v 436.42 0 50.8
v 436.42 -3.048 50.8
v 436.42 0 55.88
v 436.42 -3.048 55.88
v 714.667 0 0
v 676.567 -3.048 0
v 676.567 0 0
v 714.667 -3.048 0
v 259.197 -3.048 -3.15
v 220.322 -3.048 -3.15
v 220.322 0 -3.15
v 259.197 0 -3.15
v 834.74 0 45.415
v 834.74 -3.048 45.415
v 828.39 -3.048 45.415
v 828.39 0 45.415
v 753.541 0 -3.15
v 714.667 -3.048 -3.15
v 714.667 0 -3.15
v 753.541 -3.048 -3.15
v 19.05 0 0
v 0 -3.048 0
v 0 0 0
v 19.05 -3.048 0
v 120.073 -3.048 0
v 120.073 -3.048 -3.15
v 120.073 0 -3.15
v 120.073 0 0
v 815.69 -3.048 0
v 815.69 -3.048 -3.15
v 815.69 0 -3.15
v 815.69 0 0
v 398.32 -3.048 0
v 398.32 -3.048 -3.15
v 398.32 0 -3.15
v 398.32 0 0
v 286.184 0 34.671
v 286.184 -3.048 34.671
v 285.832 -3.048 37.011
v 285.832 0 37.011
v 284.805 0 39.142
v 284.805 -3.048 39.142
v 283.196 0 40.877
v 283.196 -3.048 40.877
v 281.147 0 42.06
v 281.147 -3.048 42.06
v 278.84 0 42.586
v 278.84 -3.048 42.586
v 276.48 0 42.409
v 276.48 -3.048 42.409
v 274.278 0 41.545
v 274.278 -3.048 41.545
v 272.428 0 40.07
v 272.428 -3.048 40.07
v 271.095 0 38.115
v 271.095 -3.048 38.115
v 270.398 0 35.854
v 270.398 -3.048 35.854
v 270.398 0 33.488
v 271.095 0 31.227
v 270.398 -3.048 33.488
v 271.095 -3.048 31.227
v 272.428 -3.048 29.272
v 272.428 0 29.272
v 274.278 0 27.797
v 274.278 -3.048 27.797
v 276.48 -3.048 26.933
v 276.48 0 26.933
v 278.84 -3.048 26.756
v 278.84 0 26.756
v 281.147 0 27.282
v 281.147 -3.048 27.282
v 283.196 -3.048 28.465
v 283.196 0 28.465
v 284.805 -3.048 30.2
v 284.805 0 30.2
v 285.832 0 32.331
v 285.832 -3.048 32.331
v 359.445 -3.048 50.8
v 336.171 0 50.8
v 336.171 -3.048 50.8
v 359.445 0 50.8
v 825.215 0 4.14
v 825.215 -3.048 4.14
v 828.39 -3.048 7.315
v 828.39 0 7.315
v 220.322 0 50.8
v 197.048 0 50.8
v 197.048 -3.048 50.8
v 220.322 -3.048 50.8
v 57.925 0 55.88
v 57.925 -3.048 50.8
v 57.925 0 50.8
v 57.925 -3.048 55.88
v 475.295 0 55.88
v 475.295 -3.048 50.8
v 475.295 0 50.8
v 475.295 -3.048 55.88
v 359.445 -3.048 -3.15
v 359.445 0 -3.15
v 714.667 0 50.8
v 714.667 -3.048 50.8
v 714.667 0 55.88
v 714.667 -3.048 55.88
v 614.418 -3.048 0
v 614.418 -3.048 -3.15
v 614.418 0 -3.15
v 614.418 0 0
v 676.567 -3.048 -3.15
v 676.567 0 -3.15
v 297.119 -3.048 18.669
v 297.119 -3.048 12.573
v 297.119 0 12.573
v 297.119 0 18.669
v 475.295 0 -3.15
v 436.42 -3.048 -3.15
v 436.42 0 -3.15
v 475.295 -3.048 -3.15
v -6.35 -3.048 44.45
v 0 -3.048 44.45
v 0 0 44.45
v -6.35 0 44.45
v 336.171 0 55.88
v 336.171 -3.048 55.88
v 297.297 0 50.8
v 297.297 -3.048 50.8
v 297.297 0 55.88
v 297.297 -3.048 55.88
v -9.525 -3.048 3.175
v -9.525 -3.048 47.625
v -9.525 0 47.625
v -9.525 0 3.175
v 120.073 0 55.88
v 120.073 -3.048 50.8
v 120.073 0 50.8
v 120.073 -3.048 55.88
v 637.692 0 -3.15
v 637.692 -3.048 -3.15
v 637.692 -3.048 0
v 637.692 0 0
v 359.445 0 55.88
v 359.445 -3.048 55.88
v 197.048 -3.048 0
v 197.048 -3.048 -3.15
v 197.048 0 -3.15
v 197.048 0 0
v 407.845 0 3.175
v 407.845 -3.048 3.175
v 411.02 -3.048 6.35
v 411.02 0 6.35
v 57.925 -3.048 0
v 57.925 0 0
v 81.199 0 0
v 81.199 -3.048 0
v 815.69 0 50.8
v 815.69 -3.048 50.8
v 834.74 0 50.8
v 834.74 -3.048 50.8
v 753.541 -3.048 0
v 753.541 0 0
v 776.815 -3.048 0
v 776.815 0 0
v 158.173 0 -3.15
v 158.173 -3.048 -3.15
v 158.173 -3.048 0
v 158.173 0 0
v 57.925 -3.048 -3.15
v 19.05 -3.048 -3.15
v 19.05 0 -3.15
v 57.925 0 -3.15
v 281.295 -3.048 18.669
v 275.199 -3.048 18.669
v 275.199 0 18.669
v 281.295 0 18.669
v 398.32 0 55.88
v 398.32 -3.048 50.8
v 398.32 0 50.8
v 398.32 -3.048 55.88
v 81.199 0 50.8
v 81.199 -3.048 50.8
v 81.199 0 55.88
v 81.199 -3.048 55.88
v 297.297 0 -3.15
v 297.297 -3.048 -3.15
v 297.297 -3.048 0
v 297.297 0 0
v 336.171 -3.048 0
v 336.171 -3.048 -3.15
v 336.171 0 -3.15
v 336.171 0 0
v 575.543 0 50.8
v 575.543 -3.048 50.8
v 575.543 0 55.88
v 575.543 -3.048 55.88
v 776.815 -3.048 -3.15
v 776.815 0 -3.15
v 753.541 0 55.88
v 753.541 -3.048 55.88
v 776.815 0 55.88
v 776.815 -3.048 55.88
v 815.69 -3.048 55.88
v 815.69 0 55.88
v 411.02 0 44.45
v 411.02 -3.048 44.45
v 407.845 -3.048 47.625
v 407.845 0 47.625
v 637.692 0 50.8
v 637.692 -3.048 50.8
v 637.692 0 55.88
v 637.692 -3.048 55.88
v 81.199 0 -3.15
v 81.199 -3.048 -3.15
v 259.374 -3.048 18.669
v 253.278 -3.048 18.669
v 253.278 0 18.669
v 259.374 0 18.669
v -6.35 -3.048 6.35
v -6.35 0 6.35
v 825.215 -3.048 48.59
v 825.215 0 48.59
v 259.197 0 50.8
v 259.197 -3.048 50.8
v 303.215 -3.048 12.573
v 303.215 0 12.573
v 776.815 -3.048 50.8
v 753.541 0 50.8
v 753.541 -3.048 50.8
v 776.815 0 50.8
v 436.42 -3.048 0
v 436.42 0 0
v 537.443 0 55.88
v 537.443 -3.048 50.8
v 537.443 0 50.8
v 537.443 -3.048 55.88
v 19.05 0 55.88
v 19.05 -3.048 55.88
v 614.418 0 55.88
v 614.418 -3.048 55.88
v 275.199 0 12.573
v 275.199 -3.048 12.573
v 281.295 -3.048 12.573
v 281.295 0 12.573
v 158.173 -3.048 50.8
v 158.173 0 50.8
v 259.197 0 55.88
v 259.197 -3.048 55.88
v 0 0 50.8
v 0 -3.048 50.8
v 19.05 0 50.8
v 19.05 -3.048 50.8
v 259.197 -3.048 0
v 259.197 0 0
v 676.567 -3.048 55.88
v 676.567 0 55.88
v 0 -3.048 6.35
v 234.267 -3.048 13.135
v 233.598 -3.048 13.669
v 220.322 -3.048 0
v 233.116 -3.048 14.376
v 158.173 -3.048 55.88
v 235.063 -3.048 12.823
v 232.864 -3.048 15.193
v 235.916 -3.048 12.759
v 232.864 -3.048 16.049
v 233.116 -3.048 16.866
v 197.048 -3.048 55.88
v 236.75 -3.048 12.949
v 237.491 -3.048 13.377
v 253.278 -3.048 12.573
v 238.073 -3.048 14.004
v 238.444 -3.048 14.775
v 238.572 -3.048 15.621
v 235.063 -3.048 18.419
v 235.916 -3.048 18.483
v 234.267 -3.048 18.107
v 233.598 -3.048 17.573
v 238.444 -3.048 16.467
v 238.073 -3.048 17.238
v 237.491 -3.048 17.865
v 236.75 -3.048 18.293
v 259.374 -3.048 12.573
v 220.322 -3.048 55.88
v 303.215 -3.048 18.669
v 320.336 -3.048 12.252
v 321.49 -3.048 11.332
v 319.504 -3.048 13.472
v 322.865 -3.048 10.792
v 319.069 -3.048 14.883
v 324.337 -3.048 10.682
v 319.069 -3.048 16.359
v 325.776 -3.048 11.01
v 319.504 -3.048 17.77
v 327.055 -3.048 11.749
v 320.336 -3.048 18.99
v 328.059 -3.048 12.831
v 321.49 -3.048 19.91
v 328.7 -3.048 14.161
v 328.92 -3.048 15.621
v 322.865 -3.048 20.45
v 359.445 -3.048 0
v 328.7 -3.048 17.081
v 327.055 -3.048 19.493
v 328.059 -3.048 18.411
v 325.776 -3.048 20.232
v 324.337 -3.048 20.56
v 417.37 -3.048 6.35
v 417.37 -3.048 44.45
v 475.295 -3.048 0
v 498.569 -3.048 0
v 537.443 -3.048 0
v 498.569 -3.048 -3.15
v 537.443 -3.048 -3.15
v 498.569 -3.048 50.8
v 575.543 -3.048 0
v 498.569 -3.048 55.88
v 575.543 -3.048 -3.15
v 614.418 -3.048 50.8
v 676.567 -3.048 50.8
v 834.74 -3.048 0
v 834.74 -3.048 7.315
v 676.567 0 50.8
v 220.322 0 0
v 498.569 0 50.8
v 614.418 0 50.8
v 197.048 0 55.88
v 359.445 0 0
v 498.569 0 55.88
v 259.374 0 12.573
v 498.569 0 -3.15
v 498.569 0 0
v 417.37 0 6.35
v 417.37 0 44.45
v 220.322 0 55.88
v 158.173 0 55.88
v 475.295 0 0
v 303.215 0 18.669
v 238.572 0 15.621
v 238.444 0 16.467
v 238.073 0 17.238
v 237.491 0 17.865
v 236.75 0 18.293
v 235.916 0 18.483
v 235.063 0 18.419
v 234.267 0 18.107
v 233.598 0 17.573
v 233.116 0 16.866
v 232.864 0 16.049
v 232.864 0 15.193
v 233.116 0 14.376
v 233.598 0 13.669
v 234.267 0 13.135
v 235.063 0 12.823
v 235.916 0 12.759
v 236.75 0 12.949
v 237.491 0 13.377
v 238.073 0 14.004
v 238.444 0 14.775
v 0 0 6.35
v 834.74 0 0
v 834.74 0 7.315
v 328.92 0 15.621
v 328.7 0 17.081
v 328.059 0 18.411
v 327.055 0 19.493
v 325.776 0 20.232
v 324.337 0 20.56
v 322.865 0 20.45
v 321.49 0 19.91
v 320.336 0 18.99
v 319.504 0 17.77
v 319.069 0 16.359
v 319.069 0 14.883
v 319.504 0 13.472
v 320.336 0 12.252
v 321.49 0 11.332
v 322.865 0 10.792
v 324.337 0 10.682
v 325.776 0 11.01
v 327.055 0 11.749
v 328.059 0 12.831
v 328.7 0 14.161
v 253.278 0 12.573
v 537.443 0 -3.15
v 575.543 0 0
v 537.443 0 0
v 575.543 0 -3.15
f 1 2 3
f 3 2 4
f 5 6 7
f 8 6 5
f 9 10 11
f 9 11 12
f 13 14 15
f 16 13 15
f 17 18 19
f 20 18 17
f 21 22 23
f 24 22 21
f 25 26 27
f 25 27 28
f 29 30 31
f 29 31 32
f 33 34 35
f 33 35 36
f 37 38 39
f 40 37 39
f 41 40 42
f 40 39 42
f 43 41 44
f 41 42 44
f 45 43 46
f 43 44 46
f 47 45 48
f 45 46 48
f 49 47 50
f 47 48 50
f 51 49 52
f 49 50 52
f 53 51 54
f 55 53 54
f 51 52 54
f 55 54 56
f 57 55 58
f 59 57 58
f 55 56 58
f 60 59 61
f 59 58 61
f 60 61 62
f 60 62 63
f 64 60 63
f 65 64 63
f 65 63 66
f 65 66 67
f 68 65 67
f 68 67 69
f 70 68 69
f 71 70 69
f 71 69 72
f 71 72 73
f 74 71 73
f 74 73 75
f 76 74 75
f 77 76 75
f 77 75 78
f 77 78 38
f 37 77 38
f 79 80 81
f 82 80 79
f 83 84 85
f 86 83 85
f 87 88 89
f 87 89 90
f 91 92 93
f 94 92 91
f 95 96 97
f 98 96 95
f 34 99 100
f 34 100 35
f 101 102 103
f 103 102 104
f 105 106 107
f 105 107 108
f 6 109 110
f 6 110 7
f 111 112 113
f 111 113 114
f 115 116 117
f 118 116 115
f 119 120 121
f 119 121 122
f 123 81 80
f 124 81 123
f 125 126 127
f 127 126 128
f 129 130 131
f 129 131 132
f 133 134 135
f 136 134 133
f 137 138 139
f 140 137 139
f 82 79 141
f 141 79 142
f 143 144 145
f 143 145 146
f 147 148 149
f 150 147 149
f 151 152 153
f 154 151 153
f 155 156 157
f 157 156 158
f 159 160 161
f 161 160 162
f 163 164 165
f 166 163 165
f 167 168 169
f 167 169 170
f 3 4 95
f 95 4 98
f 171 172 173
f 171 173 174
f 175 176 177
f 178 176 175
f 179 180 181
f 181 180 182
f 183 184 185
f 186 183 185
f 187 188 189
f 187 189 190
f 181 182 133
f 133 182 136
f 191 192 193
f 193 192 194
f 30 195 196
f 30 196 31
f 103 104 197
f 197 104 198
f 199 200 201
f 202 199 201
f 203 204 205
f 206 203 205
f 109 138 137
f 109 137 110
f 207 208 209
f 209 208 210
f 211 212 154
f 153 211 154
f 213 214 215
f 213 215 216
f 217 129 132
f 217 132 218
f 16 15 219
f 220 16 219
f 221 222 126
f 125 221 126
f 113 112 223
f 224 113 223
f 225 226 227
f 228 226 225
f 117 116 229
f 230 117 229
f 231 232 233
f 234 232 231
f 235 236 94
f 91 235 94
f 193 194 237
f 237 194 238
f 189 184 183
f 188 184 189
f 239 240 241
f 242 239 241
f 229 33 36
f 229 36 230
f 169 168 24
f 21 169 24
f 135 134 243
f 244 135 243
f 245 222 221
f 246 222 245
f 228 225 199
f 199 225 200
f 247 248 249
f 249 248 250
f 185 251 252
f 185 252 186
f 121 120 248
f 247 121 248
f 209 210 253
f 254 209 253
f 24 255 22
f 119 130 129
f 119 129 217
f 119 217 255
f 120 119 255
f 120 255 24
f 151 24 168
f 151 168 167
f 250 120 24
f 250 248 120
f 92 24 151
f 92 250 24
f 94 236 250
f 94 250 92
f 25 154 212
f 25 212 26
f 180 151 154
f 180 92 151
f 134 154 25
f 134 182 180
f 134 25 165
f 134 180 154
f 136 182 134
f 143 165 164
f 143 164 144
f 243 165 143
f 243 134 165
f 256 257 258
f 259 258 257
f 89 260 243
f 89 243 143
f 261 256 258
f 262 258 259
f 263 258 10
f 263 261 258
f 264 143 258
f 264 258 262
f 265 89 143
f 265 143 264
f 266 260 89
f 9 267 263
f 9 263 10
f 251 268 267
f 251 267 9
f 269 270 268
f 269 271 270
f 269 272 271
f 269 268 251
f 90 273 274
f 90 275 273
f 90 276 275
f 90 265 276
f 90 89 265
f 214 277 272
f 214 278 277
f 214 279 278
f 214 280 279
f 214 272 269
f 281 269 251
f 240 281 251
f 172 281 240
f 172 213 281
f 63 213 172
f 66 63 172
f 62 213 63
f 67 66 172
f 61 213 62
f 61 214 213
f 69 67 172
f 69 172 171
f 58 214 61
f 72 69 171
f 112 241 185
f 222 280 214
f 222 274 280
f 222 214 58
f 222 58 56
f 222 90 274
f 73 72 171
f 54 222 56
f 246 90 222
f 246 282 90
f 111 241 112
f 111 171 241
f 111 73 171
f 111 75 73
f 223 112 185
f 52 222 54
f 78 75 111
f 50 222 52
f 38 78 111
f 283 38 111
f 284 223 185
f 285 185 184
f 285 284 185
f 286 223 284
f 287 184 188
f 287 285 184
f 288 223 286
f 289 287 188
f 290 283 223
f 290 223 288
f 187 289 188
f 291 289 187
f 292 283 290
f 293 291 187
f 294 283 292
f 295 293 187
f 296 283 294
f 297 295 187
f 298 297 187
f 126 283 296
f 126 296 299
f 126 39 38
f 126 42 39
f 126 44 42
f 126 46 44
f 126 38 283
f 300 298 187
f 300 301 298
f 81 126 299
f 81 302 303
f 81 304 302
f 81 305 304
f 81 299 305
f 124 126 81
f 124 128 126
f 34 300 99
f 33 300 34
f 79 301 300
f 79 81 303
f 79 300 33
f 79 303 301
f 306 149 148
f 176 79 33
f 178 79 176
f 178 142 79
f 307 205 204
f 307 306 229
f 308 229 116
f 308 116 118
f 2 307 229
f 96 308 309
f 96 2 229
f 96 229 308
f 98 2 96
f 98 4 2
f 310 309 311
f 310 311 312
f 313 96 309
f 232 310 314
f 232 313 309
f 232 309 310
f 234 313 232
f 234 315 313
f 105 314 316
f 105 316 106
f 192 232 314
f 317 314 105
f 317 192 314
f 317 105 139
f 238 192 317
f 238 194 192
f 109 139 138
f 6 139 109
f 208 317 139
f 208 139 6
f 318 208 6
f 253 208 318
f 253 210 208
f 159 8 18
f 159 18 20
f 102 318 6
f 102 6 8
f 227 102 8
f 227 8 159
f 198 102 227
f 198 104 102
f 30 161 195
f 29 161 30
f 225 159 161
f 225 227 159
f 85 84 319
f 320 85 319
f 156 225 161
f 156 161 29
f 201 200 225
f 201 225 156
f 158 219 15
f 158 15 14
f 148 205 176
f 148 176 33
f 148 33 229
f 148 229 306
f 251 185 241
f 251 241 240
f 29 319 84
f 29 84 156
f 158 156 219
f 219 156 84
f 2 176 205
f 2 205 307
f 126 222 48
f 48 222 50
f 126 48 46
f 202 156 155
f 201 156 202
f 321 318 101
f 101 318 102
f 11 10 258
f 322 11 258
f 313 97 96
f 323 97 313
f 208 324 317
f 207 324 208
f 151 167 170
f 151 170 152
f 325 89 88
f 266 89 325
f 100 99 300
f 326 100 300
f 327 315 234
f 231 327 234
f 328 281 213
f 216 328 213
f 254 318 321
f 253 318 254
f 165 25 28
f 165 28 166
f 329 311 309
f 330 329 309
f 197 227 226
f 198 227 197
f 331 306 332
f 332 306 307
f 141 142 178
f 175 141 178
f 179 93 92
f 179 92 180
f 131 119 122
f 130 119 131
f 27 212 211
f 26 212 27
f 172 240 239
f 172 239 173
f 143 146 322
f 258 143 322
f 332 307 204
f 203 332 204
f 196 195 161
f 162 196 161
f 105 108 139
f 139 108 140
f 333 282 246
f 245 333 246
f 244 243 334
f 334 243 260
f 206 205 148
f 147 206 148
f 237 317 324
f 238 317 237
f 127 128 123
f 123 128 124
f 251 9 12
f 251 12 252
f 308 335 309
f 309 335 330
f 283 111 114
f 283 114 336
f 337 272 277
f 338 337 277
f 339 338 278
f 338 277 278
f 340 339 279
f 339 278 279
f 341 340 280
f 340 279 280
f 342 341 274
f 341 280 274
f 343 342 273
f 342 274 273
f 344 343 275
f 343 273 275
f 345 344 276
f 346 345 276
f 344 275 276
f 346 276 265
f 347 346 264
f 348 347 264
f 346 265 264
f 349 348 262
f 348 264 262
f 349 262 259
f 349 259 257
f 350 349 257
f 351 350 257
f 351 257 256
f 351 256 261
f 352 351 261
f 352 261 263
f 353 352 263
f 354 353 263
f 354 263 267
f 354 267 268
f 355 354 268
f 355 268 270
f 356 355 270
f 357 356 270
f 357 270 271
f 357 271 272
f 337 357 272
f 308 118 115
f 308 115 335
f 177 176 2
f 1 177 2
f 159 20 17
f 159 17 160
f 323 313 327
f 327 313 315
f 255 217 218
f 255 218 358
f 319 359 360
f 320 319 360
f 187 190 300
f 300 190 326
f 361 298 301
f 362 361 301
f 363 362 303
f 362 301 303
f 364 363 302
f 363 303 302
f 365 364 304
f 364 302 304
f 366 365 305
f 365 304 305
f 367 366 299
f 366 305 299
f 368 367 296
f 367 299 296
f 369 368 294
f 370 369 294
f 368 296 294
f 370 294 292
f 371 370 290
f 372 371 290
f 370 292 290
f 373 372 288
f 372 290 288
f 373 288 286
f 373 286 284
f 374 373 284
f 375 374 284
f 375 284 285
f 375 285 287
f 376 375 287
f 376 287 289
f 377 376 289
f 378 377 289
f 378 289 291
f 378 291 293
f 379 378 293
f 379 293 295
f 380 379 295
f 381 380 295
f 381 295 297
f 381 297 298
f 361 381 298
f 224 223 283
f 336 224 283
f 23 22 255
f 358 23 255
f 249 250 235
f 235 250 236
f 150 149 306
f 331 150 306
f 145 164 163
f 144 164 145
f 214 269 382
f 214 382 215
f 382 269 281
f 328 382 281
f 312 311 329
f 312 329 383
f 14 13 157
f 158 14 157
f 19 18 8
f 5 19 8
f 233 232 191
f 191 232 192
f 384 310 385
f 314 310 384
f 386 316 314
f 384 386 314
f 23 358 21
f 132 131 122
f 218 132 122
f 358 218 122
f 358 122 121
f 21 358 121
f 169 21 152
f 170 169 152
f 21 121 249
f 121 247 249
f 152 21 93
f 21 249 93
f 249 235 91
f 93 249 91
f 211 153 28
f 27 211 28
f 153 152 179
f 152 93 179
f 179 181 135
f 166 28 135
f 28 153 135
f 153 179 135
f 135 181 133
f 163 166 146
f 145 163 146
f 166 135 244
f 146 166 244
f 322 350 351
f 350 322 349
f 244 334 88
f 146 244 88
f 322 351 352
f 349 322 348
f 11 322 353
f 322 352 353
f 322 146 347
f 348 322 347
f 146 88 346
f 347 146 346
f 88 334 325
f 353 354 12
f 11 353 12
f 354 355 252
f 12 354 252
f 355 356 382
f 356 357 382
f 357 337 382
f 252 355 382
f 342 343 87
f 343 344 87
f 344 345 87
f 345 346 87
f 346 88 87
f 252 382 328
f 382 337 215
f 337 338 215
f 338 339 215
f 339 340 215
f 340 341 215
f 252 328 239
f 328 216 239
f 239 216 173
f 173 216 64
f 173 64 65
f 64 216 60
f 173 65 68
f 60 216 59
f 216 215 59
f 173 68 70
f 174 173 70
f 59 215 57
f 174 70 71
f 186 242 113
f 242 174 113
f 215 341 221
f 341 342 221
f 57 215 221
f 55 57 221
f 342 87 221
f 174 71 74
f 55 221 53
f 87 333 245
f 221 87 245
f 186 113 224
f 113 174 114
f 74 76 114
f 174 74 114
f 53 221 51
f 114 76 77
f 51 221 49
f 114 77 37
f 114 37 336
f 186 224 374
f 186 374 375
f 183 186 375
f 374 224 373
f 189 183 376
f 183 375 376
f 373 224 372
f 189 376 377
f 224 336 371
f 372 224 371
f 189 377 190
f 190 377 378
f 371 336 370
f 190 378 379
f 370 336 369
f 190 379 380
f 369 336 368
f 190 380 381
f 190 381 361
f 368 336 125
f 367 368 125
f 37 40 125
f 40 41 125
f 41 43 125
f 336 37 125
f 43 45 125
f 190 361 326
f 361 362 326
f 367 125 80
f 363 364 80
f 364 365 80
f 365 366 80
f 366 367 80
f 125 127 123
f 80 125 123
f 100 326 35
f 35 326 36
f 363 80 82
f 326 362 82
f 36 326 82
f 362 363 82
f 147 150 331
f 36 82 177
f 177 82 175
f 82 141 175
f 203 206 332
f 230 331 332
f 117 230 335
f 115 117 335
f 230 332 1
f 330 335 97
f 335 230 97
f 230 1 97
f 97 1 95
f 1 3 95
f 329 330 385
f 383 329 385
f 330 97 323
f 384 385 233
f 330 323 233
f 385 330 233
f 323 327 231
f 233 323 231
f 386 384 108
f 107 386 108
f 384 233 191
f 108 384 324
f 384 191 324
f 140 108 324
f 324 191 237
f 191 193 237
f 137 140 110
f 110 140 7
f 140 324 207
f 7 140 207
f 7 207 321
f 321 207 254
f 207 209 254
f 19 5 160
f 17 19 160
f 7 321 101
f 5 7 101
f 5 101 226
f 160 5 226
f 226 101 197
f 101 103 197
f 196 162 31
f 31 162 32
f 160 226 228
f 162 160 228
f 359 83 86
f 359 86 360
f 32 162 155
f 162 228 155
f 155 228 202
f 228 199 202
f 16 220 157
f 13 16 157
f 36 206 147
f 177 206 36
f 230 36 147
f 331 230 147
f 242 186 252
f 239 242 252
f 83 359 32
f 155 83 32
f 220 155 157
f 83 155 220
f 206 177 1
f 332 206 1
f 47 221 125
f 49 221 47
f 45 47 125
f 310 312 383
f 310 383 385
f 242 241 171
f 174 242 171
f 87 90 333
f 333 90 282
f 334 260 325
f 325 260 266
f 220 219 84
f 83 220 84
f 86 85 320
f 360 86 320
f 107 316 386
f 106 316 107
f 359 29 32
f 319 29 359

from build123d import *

# Parameters (mm, degrees)
F0_W      = 834.7400754492
F0_H      = 50.8
F1_DEPTH  = 3.048
F3_W      = 57.9247
F3_H      = 5.08
F3_W_2    = 115.8494
F3_H_2    = 3.1496
F4_DEPTH  = 3.048
F6_DEPTH  = 3.048
F7_DEPTH  = 3.049
F9_W      = 6.096
F9_H      = 6.096
F9_R      = 2.8702
F9_R_2    = 4.953
F9_R_3    = 7.9375
F10_DEPTH = 3.049
F11_DEPTH = 25.4
F12_W     = 38.1
F12_H     = 5.08
F12_H_2   = 3.1496
F13_DEPTH = 3.048


# Not quite as in the source:
# - a feature names something its author has since deleted; it is built from what else it names


with BuildPart() as f1:
    # F0 (on Front) → F1 (new body)
    with BuildSketch(Plane.XZ):
        with Locations((417.3700377246, 25.4)):
            Rectangle(F0_W, F0_H)
    extrude(amount=F1_DEPTH)

    # F3 (on face) → F4 (join)
    with BuildSketch(Plane.XZ.offset(3.048)):
        with Locations((28.96235, 53.34)):
            Rectangle(F3_W, F3_H)
        with Locations((139.1233459082, 53.34)):
            Rectangle(F3_W_2, F3_H)
        with Locations((278.2466918164, 53.34)):
            Rectangle(F3_W_2, F3_H)
        with Locations((417.3700377246, 53.34)):
            Rectangle(F3_W_2, F3_H)
        with Locations((556.4933836328, 53.34)):
            Rectangle(F3_W_2, F3_H)
        with Locations((695.616729541, 53.34)):
            Rectangle(F3_W_2, F3_H)
        with Locations((805.7777254492, 53.34)):
            Rectangle(F3_W, F3_H)
        with Locations((28.96235, -1.5748)):
            Rectangle(F3_W, F3_H_2)
        with Locations((139.1233459082, -1.5748)):
            Rectangle(F3_W_2, F3_H_2)
        with Locations((278.2466918164, -1.5748)):
            Rectangle(F3_W_2, F3_H_2)
        with Locations((417.3700377246, -1.5748)):
            Rectangle(F3_W_2, F3_H_2)
        with Locations((556.4933836328, -1.5748)):
            Rectangle(F3_W_2, F3_H_2)
        with Locations((695.616729541, -1.5748)):
            Rectangle(F3_W_2, F3_H_2)
        with Locations((805.7777254492, -1.5748)):
            Rectangle(F3_W, F3_H_2)
    extrude(amount=-F4_DEPTH)

    # F5 (on face) → F6 (join)
    with BuildSketch(Plane.XZ.offset(3.048)):
        Polygon((-6.35, 6.35), (0, 6.35), (0, 44.45), (-6.35, 44.45), (-9.525, 47.625), (-9.525, 3.175), align=None)
    extrude(amount=-F6_DEPTH)

    # F5 (on face) → F7 (cut, through all)
    with BuildSketch(Plane.XZ.offset(3.048)):
        Polygon((828.3900754492, 7.3152), (834.7400754492, 7.3152), (834.7400754492, 45.4152), (828.3900754492, 45.4152), (825.2150754492, 48.5902), (825.2150754492, 4.1402), align=None)
    extrude(amount=-F7_DEPTH, mode=Mode.SUBTRACT)

    # F9 (on face) → F10 (cut, through all)
    with BuildSketch(Plane.XZ.offset(3.048)):
        with Locations((256.3264918164, 15.621)):
            Rectangle(F9_W, F9_H)
        with Locations((278.2466918164, 15.621)):
            Rectangle(F9_W, F9_H)
        with Locations((300.1668918164, 15.621)):
            Rectangle(F9_W, F9_H)
        with Locations((235.7016918164, 15.621)):
            Circle(F9_R)
        with Locations((323.9666918164, 15.621)):
            Circle(F9_R_2)
        with Locations((278.2466918164, 34.671)):
            Circle(F9_R_3)
    extrude(amount=-F10_DEPTH, mode=Mode.SUBTRACT)

    # F8 (on face) → F11 (cut)
    with BuildSketch(Plane.XZ.offset(3.048)):
        Polygon((411.0200377246, 6.35), (417.3700377246, 6.35), (417.3700377246, 44.45), (411.0200377246, 44.45), (407.8450377246, 47.625), (407.8450377246, 3.175), align=None)
    extrude(amount=-F11_DEPTH, mode=Mode.SUBTRACT)

    # F12 (on face) → F13 (cut, through all)
    with BuildSketch(Plane.XZ.offset(3.048)):
        with Locations((139.1233459082, 53.34)):
            Rectangle(F12_W, F12_H)
        with Locations((278.2466918164, 53.34)):
            Rectangle(F12_W, F12_H)
        with Locations((417.3700377246, 53.34)):
            Rectangle(F12_W, F12_H)
        with Locations((556.4933836328, 53.34)):
            Rectangle(F12_W, F12_H)
        with Locations((695.616729541, 53.34)):
            Rectangle(F12_W, F12_H)
        with Locations((834.7400754492, 53.34)):
            Rectangle(F12_W, F12_H)
        with Locations((0, 53.34)):
            Rectangle(F12_W, F12_H)
        with Locations((0, -1.5748)):
            Rectangle(F12_W, F12_H_2)
        with Locations((139.1233459082, -1.5748)):
            Rectangle(F12_W, F12_H_2)
        with Locations((278.2466918164, -1.5748)):
            Rectangle(F12_W, F12_H_2)
        with Locations((417.3700377246, -1.5748)):
            Rectangle(F12_W, F12_H_2)
        with Locations((556.4933836328, -1.5748)):
            Rectangle(F12_W, F12_H_2)
        with Locations((695.616729541, -1.5748)):
            Rectangle(F12_W, F12_H_2)
        with Locations((834.7400754492, -1.5748)):
            Rectangle(F12_W, F12_H_2)
    extrude(amount=-F13_DEPTH, mode=Mode.SUBTRACT)


solid = f1.part
